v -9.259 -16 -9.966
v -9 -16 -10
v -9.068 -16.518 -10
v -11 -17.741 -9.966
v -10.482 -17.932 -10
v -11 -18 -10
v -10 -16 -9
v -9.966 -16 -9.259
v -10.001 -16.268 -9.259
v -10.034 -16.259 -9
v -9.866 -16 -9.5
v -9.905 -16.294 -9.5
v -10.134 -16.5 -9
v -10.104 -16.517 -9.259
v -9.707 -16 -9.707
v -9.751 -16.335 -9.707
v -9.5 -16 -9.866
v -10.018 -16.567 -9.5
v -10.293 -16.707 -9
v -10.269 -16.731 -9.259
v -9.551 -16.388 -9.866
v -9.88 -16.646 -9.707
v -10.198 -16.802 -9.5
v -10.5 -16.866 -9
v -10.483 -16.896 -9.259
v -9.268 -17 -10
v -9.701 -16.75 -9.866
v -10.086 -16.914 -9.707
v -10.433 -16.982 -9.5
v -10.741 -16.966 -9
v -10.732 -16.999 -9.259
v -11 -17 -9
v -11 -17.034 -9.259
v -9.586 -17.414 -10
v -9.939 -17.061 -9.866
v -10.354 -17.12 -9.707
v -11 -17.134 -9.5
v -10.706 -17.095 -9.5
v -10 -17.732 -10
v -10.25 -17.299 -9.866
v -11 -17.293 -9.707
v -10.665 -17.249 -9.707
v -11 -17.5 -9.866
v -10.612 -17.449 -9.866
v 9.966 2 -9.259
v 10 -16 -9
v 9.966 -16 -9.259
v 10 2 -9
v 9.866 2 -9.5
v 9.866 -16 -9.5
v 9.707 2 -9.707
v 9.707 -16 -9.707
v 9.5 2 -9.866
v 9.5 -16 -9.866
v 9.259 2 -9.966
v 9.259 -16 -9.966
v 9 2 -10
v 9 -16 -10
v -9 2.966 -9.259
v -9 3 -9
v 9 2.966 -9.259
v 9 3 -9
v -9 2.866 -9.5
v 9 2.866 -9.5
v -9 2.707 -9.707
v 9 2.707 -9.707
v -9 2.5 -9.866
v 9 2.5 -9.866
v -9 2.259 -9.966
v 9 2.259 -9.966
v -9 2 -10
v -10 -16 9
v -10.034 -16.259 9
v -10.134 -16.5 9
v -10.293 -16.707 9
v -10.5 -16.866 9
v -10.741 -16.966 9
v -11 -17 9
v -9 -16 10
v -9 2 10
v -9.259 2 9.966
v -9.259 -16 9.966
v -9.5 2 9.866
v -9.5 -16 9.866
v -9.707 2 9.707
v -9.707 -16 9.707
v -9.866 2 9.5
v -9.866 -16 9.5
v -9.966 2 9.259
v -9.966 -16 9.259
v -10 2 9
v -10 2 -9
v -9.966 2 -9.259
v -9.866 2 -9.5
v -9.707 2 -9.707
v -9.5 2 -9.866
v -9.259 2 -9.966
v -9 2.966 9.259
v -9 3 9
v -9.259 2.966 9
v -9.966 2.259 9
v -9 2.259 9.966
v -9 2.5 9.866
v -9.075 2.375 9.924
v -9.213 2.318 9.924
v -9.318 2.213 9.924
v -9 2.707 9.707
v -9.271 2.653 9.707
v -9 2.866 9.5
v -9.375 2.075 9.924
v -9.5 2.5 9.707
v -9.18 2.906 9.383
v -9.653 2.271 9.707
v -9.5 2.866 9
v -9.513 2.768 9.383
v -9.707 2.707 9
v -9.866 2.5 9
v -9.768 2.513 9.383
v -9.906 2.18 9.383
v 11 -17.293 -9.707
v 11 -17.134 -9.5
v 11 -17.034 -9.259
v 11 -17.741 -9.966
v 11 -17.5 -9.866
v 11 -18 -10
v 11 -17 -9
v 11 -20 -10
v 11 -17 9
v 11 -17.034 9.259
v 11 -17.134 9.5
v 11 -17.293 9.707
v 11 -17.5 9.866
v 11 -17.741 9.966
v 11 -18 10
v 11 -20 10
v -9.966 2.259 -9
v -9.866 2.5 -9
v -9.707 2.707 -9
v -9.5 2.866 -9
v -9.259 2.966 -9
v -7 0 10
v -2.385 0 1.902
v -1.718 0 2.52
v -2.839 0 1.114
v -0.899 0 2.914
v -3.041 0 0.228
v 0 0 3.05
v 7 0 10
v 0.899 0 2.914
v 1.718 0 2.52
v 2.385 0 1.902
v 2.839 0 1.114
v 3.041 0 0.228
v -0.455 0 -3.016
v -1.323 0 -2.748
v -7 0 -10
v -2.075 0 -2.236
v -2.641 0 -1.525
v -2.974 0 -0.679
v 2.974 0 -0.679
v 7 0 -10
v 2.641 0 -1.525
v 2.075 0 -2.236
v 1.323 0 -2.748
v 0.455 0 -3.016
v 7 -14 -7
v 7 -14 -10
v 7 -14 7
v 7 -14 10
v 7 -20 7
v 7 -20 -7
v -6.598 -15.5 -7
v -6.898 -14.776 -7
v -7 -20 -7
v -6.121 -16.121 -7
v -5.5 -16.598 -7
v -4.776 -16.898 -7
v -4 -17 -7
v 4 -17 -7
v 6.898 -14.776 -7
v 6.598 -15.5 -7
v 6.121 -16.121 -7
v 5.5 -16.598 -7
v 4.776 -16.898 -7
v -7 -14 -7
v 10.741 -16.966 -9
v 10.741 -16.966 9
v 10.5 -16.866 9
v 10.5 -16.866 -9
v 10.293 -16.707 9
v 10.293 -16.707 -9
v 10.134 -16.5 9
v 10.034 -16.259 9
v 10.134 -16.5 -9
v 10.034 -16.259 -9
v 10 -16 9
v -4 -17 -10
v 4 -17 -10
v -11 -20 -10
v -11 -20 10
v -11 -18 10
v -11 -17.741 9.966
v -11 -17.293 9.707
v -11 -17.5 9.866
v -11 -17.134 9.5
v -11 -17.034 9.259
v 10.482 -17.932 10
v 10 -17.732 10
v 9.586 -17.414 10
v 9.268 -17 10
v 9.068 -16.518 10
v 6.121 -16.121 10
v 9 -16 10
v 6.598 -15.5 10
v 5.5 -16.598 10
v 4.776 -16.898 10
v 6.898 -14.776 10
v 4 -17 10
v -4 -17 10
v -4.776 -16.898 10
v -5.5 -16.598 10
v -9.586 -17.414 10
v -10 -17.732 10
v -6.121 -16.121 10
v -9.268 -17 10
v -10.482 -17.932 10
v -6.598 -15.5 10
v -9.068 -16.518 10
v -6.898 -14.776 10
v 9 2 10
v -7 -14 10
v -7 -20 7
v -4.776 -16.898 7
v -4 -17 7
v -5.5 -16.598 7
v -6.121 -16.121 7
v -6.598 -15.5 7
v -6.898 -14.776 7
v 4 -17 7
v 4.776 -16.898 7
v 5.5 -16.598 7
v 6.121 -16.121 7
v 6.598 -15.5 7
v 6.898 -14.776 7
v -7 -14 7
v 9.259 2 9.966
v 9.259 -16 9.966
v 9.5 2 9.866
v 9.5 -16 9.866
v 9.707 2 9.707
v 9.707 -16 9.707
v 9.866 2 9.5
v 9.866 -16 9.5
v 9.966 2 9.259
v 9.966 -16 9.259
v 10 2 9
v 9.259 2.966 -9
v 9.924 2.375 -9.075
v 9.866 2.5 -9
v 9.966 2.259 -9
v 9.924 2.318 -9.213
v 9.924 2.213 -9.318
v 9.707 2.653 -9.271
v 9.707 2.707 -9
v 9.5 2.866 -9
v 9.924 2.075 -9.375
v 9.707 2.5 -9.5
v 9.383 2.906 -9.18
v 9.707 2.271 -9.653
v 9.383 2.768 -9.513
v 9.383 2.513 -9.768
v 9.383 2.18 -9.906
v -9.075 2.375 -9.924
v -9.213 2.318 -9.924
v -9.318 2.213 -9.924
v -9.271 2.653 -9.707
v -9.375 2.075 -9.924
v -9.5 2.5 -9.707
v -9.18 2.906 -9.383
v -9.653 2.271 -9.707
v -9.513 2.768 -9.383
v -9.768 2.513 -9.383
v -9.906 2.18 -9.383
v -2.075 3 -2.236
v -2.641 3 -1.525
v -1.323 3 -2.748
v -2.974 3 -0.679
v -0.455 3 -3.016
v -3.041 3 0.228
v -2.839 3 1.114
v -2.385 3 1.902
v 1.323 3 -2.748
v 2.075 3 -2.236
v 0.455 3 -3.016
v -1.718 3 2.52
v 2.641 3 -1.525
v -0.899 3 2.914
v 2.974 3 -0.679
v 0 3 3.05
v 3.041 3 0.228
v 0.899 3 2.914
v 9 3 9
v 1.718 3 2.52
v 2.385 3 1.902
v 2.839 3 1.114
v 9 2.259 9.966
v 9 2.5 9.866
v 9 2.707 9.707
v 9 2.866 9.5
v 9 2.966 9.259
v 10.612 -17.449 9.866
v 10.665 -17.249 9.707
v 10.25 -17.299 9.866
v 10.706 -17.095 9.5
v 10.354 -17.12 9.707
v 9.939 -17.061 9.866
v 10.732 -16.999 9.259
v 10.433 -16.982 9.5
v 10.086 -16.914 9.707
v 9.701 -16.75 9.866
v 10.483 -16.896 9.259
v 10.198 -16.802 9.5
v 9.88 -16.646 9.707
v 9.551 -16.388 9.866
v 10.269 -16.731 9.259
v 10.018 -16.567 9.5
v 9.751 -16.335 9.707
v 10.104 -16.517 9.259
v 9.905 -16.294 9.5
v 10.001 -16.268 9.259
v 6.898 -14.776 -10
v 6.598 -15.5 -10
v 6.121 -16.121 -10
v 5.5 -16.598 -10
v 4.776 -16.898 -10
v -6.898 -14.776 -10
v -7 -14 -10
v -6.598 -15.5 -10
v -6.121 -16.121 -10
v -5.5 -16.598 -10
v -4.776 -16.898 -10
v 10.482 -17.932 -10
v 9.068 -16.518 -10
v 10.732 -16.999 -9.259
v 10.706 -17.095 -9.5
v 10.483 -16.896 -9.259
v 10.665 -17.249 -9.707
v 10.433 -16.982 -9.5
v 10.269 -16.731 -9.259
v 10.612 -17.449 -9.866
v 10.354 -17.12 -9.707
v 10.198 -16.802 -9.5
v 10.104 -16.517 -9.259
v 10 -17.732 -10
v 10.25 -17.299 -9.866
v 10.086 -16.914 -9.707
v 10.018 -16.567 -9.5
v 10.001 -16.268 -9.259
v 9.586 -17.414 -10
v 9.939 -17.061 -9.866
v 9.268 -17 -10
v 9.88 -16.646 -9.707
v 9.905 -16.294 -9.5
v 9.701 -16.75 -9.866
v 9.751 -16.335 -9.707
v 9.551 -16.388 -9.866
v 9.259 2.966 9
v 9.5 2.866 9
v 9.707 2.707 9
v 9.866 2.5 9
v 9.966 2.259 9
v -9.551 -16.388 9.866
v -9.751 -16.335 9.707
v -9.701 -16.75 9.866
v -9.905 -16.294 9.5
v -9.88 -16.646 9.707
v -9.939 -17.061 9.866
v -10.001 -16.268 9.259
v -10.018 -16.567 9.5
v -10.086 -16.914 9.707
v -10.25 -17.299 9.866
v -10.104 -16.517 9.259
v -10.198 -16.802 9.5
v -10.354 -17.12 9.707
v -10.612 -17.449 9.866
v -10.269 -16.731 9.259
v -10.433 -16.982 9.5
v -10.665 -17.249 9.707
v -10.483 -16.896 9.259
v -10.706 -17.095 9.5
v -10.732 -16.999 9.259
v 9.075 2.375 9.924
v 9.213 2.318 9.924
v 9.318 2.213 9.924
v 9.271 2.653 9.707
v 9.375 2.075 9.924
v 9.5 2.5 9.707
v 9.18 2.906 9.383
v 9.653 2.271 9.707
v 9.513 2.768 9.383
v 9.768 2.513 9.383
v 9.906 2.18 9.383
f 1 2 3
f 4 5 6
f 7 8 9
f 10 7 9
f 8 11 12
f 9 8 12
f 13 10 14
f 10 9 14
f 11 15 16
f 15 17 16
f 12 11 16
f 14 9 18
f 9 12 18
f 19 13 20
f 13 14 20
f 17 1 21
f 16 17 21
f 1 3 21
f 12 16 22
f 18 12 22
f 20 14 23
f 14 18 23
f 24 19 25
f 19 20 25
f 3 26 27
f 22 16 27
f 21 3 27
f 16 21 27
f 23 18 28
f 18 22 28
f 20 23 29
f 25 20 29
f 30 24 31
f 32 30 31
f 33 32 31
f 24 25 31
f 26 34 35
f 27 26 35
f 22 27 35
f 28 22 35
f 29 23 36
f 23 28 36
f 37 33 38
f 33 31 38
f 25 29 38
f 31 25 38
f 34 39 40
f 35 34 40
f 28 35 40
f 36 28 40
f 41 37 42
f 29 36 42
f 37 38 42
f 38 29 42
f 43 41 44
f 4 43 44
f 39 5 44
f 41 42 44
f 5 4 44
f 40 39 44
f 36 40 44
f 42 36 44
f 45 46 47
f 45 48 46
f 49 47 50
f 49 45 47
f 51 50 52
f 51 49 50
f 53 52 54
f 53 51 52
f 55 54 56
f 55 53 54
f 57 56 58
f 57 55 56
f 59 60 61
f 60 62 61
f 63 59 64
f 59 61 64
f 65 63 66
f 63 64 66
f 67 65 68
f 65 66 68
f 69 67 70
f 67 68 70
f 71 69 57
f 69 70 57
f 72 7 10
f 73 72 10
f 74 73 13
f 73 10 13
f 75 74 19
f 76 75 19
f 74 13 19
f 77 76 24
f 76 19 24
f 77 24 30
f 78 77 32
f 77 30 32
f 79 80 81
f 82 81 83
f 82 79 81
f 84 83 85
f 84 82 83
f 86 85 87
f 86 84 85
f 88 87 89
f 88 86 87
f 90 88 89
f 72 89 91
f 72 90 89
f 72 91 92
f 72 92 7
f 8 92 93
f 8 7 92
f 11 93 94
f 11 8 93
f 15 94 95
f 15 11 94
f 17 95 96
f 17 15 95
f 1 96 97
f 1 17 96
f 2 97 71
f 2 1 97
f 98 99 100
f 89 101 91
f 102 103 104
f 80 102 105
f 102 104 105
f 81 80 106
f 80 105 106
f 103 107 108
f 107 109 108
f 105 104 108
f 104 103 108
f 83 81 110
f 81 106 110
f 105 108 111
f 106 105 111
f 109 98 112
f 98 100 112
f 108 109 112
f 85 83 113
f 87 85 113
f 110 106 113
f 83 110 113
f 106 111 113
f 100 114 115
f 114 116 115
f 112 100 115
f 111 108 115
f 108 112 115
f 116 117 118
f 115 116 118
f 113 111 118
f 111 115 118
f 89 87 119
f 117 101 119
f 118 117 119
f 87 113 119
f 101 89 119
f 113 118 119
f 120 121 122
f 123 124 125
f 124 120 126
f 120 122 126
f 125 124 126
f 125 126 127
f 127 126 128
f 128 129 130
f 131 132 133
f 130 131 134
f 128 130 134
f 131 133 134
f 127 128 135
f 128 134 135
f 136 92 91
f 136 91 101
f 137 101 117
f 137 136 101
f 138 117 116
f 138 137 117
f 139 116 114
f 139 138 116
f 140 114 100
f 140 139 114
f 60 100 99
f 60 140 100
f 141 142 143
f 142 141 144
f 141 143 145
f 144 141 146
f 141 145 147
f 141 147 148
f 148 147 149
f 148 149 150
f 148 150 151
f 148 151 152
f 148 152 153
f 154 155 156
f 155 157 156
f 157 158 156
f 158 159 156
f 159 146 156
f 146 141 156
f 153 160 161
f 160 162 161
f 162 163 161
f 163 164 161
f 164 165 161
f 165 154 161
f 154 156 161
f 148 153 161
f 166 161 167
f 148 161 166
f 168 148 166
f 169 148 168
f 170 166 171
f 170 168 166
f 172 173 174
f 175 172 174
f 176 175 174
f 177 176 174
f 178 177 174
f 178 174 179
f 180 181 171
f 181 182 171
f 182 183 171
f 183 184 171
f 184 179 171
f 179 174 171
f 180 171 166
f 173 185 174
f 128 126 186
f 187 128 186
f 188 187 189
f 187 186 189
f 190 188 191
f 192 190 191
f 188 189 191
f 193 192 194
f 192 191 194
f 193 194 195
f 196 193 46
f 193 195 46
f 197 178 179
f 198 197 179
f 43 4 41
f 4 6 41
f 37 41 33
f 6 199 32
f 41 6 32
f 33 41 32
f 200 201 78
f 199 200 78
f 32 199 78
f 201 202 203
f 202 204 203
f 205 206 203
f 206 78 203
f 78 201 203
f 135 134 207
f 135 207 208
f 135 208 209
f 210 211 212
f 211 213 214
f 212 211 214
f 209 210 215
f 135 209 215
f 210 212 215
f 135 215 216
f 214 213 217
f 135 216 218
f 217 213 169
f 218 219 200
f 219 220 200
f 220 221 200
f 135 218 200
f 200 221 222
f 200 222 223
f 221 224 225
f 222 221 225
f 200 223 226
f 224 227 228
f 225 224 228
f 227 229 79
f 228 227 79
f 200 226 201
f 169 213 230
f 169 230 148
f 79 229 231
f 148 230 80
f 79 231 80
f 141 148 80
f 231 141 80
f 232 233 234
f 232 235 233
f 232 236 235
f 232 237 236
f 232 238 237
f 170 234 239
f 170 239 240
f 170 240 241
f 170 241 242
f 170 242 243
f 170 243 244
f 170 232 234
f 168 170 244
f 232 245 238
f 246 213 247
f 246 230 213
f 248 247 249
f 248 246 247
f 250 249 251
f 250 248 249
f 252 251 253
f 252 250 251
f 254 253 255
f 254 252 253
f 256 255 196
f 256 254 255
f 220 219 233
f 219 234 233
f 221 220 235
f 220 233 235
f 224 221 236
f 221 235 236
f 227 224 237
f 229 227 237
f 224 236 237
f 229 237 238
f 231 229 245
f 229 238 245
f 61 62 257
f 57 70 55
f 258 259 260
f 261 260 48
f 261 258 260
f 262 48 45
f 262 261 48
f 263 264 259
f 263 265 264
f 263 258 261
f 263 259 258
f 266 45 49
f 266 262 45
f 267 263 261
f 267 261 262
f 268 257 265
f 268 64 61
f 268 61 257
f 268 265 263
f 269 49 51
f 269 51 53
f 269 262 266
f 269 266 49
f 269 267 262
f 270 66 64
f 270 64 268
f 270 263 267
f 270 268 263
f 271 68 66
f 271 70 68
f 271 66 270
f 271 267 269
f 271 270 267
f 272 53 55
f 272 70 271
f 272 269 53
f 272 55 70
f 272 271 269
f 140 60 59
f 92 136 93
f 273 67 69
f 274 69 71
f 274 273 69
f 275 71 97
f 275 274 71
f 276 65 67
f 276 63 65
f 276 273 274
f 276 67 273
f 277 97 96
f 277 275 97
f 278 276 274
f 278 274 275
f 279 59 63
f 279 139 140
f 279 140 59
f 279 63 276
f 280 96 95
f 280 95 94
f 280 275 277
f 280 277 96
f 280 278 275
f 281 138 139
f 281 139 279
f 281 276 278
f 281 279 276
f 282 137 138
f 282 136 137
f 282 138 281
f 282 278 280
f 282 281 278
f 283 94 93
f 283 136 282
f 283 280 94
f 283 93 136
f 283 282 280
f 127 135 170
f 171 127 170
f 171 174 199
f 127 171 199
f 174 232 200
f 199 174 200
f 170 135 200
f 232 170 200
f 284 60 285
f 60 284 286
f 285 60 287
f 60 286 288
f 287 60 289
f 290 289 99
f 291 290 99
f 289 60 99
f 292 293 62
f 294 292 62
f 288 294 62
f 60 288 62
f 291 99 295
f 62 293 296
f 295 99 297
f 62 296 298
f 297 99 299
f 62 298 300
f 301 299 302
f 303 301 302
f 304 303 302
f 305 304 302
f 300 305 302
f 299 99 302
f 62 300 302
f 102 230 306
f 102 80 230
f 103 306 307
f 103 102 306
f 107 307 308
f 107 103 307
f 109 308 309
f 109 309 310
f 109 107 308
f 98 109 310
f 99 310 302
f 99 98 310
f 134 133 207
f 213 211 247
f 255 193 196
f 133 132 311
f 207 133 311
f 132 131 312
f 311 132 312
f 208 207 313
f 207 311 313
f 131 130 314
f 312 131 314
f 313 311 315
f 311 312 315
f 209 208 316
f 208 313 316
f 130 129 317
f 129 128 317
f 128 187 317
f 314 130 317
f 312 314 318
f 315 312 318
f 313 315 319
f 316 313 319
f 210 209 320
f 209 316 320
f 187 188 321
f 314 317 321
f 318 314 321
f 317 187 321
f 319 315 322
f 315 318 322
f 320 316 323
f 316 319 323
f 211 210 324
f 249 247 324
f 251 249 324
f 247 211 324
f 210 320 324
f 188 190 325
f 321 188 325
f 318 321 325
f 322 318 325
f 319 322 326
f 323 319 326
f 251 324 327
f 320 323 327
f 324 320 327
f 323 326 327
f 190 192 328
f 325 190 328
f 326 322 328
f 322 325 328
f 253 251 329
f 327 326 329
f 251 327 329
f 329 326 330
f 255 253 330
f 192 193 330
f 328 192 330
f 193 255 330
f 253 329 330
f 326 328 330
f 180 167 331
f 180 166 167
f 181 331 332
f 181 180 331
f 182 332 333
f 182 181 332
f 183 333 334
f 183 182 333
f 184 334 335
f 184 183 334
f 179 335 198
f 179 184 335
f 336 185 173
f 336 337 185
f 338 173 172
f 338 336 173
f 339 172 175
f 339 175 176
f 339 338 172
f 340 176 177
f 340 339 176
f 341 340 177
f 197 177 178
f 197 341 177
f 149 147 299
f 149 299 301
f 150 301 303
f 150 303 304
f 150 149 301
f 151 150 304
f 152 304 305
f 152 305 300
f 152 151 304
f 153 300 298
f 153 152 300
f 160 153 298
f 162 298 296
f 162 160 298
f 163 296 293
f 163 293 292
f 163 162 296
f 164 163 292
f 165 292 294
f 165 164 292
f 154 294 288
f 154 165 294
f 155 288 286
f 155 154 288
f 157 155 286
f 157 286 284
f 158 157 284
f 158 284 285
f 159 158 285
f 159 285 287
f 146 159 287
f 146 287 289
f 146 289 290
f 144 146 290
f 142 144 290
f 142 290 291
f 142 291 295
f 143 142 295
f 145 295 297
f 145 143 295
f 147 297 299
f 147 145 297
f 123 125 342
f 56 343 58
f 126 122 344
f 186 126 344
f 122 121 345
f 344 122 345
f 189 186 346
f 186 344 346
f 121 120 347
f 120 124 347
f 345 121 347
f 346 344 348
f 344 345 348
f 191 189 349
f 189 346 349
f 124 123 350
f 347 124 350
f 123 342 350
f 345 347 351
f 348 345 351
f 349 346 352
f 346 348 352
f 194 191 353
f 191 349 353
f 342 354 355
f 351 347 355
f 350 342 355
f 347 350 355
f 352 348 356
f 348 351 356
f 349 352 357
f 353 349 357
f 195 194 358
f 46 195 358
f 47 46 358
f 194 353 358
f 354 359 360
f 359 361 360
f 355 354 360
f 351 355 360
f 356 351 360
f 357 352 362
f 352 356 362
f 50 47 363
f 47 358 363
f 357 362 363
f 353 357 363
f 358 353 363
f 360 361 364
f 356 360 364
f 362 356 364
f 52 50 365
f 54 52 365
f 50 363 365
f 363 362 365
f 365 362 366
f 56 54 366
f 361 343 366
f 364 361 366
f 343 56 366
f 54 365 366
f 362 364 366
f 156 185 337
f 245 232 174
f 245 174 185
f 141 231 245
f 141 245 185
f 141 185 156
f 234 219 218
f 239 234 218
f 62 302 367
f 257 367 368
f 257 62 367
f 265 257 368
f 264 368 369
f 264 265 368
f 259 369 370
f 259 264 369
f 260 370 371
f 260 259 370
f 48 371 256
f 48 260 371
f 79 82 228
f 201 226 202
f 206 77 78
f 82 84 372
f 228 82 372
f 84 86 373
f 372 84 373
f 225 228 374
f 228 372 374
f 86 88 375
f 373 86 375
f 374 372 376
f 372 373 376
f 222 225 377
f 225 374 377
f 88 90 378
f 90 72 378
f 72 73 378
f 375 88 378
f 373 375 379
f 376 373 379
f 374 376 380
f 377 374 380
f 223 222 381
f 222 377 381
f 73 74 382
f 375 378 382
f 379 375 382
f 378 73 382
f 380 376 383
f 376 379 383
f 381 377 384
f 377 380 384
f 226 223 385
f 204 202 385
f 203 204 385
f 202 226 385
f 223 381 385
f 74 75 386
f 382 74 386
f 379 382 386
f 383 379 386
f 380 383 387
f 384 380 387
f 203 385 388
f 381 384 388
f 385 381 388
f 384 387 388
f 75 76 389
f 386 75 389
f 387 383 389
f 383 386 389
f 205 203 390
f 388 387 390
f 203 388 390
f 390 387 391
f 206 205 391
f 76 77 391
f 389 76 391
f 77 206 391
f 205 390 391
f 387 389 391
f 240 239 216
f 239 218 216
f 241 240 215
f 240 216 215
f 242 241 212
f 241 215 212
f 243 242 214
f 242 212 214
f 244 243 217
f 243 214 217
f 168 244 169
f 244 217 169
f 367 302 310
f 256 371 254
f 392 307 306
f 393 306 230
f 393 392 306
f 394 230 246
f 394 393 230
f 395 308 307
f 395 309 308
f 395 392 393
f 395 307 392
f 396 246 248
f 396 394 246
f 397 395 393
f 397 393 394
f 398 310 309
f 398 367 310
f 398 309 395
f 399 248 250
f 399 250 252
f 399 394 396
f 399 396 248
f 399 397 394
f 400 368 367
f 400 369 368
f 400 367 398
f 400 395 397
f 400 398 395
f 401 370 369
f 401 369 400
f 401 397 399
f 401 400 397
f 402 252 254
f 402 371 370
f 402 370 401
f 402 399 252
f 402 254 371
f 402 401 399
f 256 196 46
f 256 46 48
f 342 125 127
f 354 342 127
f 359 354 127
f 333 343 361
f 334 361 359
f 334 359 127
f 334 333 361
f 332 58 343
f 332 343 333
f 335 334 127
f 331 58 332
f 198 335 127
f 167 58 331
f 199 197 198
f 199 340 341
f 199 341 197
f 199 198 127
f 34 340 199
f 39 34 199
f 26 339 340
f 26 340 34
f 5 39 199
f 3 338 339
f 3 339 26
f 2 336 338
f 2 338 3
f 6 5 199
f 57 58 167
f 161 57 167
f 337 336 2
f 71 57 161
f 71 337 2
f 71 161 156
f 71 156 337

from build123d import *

# Parameters (mm, degrees)
SKETCH_1_W      = 14
SKETCH_1_H      = 20
SKETCH_1_R      = 3.05
EXTRUDE_1_DEPTH = 3
EXTRUDE_2_DEPTH = 20
SKETCH_4_W      = 22
SKETCH_4_H      = 20
SKETCH_4_W_2    = 14
SKETCH_4_H_2    = 14
EXTRUDE_4_DEPTH = 3
FILLET_2_R      = 1
FILLET_3_R      = 3


with BuildPart() as part:
    # 草图1 → 凸台-拉伸1 (new body)
    with BuildSketch(Plane(origin=(0, 0, 0), x_dir=(1, 0, 0), z_dir=(0, 1, 0))):
        Rectangle(SKETCH_1_W, SKETCH_1_H)
        with Locations(Location((0, 0, 0), (0, 0, 270))):
            Circle(SKETCH_1_R, mode=Mode.SUBTRACT)
    extrude(amount=EXTRUDE_1_DEPTH)

    # 草图2 → 凸台-拉伸2 (add)
    with BuildSketch(Plane.XY.offset(10)):
        Polygon((-7, 3), (-7, 0), (-7, -20), (-11, -20), (-11, -17), (-10, -17), (-10, 0), (-10, 3), align=None)
        Polygon((10, 3), (10, 0), (10, -17), (11, -17), (11, -20), (7, -20), (7, 0), (7, 3), align=None)
    extrude(amount=-EXTRUDE_2_DEPTH)

    # 草图4 → 凸台-拉伸4 (add)
    with BuildSketch(Plane.XZ.offset(20)):
        Rectangle(SKETCH_4_W, SKETCH_4_H)
        Rectangle(SKETCH_4_W_2, SKETCH_4_H_2, mode=Mode.SUBTRACT)
    extrude(amount=-EXTRUDE_4_DEPTH)

    # 圆角2
    fillet_2_edges = [part.edges().sort_by_distance(p)[0] for p in [
        (-10, -17, 0),
        (10, -17, 0),
    ]]
    fillet(fillet_2_edges, radius=FILLET_2_R - 0.0001)  # a hair under: the kernel refuses the full size
    fillet_2_2_edges = [part.edges().sort_by_distance(p)[0] for p in [
        (-10, 3, 0),
        (0, 3, -10),
        (10, 3, 0),
        (0, 3, 10),
        (-10, -6.50005, -10),
        (-10, -6.50005, 10),
        (10, -6.50005, -10),
        (10, -6.50005, 10),
        (10.292863929, -16.707136071, 10),
        (10.292863929, -16.707136071, -10),
        (-10.292863929, -16.707136071, 10),
        (-10.292863929, -16.707136071, -10),
    ]]
    fillet(fillet_2_2_edges, radius=FILLET_2_R)

    # 圆角3
    fillet_3_edges = [part.edges().sort_by_distance(p)[0] for p in [
        (7, -17, -8.5),
        (7, -17, 8.5),
        (-7, -17, -8.5),
        (-7, -17, 8.5),
    ]]
    fillet(fillet_3_edges, radius=FILLET_3_R)


solid = part.part
